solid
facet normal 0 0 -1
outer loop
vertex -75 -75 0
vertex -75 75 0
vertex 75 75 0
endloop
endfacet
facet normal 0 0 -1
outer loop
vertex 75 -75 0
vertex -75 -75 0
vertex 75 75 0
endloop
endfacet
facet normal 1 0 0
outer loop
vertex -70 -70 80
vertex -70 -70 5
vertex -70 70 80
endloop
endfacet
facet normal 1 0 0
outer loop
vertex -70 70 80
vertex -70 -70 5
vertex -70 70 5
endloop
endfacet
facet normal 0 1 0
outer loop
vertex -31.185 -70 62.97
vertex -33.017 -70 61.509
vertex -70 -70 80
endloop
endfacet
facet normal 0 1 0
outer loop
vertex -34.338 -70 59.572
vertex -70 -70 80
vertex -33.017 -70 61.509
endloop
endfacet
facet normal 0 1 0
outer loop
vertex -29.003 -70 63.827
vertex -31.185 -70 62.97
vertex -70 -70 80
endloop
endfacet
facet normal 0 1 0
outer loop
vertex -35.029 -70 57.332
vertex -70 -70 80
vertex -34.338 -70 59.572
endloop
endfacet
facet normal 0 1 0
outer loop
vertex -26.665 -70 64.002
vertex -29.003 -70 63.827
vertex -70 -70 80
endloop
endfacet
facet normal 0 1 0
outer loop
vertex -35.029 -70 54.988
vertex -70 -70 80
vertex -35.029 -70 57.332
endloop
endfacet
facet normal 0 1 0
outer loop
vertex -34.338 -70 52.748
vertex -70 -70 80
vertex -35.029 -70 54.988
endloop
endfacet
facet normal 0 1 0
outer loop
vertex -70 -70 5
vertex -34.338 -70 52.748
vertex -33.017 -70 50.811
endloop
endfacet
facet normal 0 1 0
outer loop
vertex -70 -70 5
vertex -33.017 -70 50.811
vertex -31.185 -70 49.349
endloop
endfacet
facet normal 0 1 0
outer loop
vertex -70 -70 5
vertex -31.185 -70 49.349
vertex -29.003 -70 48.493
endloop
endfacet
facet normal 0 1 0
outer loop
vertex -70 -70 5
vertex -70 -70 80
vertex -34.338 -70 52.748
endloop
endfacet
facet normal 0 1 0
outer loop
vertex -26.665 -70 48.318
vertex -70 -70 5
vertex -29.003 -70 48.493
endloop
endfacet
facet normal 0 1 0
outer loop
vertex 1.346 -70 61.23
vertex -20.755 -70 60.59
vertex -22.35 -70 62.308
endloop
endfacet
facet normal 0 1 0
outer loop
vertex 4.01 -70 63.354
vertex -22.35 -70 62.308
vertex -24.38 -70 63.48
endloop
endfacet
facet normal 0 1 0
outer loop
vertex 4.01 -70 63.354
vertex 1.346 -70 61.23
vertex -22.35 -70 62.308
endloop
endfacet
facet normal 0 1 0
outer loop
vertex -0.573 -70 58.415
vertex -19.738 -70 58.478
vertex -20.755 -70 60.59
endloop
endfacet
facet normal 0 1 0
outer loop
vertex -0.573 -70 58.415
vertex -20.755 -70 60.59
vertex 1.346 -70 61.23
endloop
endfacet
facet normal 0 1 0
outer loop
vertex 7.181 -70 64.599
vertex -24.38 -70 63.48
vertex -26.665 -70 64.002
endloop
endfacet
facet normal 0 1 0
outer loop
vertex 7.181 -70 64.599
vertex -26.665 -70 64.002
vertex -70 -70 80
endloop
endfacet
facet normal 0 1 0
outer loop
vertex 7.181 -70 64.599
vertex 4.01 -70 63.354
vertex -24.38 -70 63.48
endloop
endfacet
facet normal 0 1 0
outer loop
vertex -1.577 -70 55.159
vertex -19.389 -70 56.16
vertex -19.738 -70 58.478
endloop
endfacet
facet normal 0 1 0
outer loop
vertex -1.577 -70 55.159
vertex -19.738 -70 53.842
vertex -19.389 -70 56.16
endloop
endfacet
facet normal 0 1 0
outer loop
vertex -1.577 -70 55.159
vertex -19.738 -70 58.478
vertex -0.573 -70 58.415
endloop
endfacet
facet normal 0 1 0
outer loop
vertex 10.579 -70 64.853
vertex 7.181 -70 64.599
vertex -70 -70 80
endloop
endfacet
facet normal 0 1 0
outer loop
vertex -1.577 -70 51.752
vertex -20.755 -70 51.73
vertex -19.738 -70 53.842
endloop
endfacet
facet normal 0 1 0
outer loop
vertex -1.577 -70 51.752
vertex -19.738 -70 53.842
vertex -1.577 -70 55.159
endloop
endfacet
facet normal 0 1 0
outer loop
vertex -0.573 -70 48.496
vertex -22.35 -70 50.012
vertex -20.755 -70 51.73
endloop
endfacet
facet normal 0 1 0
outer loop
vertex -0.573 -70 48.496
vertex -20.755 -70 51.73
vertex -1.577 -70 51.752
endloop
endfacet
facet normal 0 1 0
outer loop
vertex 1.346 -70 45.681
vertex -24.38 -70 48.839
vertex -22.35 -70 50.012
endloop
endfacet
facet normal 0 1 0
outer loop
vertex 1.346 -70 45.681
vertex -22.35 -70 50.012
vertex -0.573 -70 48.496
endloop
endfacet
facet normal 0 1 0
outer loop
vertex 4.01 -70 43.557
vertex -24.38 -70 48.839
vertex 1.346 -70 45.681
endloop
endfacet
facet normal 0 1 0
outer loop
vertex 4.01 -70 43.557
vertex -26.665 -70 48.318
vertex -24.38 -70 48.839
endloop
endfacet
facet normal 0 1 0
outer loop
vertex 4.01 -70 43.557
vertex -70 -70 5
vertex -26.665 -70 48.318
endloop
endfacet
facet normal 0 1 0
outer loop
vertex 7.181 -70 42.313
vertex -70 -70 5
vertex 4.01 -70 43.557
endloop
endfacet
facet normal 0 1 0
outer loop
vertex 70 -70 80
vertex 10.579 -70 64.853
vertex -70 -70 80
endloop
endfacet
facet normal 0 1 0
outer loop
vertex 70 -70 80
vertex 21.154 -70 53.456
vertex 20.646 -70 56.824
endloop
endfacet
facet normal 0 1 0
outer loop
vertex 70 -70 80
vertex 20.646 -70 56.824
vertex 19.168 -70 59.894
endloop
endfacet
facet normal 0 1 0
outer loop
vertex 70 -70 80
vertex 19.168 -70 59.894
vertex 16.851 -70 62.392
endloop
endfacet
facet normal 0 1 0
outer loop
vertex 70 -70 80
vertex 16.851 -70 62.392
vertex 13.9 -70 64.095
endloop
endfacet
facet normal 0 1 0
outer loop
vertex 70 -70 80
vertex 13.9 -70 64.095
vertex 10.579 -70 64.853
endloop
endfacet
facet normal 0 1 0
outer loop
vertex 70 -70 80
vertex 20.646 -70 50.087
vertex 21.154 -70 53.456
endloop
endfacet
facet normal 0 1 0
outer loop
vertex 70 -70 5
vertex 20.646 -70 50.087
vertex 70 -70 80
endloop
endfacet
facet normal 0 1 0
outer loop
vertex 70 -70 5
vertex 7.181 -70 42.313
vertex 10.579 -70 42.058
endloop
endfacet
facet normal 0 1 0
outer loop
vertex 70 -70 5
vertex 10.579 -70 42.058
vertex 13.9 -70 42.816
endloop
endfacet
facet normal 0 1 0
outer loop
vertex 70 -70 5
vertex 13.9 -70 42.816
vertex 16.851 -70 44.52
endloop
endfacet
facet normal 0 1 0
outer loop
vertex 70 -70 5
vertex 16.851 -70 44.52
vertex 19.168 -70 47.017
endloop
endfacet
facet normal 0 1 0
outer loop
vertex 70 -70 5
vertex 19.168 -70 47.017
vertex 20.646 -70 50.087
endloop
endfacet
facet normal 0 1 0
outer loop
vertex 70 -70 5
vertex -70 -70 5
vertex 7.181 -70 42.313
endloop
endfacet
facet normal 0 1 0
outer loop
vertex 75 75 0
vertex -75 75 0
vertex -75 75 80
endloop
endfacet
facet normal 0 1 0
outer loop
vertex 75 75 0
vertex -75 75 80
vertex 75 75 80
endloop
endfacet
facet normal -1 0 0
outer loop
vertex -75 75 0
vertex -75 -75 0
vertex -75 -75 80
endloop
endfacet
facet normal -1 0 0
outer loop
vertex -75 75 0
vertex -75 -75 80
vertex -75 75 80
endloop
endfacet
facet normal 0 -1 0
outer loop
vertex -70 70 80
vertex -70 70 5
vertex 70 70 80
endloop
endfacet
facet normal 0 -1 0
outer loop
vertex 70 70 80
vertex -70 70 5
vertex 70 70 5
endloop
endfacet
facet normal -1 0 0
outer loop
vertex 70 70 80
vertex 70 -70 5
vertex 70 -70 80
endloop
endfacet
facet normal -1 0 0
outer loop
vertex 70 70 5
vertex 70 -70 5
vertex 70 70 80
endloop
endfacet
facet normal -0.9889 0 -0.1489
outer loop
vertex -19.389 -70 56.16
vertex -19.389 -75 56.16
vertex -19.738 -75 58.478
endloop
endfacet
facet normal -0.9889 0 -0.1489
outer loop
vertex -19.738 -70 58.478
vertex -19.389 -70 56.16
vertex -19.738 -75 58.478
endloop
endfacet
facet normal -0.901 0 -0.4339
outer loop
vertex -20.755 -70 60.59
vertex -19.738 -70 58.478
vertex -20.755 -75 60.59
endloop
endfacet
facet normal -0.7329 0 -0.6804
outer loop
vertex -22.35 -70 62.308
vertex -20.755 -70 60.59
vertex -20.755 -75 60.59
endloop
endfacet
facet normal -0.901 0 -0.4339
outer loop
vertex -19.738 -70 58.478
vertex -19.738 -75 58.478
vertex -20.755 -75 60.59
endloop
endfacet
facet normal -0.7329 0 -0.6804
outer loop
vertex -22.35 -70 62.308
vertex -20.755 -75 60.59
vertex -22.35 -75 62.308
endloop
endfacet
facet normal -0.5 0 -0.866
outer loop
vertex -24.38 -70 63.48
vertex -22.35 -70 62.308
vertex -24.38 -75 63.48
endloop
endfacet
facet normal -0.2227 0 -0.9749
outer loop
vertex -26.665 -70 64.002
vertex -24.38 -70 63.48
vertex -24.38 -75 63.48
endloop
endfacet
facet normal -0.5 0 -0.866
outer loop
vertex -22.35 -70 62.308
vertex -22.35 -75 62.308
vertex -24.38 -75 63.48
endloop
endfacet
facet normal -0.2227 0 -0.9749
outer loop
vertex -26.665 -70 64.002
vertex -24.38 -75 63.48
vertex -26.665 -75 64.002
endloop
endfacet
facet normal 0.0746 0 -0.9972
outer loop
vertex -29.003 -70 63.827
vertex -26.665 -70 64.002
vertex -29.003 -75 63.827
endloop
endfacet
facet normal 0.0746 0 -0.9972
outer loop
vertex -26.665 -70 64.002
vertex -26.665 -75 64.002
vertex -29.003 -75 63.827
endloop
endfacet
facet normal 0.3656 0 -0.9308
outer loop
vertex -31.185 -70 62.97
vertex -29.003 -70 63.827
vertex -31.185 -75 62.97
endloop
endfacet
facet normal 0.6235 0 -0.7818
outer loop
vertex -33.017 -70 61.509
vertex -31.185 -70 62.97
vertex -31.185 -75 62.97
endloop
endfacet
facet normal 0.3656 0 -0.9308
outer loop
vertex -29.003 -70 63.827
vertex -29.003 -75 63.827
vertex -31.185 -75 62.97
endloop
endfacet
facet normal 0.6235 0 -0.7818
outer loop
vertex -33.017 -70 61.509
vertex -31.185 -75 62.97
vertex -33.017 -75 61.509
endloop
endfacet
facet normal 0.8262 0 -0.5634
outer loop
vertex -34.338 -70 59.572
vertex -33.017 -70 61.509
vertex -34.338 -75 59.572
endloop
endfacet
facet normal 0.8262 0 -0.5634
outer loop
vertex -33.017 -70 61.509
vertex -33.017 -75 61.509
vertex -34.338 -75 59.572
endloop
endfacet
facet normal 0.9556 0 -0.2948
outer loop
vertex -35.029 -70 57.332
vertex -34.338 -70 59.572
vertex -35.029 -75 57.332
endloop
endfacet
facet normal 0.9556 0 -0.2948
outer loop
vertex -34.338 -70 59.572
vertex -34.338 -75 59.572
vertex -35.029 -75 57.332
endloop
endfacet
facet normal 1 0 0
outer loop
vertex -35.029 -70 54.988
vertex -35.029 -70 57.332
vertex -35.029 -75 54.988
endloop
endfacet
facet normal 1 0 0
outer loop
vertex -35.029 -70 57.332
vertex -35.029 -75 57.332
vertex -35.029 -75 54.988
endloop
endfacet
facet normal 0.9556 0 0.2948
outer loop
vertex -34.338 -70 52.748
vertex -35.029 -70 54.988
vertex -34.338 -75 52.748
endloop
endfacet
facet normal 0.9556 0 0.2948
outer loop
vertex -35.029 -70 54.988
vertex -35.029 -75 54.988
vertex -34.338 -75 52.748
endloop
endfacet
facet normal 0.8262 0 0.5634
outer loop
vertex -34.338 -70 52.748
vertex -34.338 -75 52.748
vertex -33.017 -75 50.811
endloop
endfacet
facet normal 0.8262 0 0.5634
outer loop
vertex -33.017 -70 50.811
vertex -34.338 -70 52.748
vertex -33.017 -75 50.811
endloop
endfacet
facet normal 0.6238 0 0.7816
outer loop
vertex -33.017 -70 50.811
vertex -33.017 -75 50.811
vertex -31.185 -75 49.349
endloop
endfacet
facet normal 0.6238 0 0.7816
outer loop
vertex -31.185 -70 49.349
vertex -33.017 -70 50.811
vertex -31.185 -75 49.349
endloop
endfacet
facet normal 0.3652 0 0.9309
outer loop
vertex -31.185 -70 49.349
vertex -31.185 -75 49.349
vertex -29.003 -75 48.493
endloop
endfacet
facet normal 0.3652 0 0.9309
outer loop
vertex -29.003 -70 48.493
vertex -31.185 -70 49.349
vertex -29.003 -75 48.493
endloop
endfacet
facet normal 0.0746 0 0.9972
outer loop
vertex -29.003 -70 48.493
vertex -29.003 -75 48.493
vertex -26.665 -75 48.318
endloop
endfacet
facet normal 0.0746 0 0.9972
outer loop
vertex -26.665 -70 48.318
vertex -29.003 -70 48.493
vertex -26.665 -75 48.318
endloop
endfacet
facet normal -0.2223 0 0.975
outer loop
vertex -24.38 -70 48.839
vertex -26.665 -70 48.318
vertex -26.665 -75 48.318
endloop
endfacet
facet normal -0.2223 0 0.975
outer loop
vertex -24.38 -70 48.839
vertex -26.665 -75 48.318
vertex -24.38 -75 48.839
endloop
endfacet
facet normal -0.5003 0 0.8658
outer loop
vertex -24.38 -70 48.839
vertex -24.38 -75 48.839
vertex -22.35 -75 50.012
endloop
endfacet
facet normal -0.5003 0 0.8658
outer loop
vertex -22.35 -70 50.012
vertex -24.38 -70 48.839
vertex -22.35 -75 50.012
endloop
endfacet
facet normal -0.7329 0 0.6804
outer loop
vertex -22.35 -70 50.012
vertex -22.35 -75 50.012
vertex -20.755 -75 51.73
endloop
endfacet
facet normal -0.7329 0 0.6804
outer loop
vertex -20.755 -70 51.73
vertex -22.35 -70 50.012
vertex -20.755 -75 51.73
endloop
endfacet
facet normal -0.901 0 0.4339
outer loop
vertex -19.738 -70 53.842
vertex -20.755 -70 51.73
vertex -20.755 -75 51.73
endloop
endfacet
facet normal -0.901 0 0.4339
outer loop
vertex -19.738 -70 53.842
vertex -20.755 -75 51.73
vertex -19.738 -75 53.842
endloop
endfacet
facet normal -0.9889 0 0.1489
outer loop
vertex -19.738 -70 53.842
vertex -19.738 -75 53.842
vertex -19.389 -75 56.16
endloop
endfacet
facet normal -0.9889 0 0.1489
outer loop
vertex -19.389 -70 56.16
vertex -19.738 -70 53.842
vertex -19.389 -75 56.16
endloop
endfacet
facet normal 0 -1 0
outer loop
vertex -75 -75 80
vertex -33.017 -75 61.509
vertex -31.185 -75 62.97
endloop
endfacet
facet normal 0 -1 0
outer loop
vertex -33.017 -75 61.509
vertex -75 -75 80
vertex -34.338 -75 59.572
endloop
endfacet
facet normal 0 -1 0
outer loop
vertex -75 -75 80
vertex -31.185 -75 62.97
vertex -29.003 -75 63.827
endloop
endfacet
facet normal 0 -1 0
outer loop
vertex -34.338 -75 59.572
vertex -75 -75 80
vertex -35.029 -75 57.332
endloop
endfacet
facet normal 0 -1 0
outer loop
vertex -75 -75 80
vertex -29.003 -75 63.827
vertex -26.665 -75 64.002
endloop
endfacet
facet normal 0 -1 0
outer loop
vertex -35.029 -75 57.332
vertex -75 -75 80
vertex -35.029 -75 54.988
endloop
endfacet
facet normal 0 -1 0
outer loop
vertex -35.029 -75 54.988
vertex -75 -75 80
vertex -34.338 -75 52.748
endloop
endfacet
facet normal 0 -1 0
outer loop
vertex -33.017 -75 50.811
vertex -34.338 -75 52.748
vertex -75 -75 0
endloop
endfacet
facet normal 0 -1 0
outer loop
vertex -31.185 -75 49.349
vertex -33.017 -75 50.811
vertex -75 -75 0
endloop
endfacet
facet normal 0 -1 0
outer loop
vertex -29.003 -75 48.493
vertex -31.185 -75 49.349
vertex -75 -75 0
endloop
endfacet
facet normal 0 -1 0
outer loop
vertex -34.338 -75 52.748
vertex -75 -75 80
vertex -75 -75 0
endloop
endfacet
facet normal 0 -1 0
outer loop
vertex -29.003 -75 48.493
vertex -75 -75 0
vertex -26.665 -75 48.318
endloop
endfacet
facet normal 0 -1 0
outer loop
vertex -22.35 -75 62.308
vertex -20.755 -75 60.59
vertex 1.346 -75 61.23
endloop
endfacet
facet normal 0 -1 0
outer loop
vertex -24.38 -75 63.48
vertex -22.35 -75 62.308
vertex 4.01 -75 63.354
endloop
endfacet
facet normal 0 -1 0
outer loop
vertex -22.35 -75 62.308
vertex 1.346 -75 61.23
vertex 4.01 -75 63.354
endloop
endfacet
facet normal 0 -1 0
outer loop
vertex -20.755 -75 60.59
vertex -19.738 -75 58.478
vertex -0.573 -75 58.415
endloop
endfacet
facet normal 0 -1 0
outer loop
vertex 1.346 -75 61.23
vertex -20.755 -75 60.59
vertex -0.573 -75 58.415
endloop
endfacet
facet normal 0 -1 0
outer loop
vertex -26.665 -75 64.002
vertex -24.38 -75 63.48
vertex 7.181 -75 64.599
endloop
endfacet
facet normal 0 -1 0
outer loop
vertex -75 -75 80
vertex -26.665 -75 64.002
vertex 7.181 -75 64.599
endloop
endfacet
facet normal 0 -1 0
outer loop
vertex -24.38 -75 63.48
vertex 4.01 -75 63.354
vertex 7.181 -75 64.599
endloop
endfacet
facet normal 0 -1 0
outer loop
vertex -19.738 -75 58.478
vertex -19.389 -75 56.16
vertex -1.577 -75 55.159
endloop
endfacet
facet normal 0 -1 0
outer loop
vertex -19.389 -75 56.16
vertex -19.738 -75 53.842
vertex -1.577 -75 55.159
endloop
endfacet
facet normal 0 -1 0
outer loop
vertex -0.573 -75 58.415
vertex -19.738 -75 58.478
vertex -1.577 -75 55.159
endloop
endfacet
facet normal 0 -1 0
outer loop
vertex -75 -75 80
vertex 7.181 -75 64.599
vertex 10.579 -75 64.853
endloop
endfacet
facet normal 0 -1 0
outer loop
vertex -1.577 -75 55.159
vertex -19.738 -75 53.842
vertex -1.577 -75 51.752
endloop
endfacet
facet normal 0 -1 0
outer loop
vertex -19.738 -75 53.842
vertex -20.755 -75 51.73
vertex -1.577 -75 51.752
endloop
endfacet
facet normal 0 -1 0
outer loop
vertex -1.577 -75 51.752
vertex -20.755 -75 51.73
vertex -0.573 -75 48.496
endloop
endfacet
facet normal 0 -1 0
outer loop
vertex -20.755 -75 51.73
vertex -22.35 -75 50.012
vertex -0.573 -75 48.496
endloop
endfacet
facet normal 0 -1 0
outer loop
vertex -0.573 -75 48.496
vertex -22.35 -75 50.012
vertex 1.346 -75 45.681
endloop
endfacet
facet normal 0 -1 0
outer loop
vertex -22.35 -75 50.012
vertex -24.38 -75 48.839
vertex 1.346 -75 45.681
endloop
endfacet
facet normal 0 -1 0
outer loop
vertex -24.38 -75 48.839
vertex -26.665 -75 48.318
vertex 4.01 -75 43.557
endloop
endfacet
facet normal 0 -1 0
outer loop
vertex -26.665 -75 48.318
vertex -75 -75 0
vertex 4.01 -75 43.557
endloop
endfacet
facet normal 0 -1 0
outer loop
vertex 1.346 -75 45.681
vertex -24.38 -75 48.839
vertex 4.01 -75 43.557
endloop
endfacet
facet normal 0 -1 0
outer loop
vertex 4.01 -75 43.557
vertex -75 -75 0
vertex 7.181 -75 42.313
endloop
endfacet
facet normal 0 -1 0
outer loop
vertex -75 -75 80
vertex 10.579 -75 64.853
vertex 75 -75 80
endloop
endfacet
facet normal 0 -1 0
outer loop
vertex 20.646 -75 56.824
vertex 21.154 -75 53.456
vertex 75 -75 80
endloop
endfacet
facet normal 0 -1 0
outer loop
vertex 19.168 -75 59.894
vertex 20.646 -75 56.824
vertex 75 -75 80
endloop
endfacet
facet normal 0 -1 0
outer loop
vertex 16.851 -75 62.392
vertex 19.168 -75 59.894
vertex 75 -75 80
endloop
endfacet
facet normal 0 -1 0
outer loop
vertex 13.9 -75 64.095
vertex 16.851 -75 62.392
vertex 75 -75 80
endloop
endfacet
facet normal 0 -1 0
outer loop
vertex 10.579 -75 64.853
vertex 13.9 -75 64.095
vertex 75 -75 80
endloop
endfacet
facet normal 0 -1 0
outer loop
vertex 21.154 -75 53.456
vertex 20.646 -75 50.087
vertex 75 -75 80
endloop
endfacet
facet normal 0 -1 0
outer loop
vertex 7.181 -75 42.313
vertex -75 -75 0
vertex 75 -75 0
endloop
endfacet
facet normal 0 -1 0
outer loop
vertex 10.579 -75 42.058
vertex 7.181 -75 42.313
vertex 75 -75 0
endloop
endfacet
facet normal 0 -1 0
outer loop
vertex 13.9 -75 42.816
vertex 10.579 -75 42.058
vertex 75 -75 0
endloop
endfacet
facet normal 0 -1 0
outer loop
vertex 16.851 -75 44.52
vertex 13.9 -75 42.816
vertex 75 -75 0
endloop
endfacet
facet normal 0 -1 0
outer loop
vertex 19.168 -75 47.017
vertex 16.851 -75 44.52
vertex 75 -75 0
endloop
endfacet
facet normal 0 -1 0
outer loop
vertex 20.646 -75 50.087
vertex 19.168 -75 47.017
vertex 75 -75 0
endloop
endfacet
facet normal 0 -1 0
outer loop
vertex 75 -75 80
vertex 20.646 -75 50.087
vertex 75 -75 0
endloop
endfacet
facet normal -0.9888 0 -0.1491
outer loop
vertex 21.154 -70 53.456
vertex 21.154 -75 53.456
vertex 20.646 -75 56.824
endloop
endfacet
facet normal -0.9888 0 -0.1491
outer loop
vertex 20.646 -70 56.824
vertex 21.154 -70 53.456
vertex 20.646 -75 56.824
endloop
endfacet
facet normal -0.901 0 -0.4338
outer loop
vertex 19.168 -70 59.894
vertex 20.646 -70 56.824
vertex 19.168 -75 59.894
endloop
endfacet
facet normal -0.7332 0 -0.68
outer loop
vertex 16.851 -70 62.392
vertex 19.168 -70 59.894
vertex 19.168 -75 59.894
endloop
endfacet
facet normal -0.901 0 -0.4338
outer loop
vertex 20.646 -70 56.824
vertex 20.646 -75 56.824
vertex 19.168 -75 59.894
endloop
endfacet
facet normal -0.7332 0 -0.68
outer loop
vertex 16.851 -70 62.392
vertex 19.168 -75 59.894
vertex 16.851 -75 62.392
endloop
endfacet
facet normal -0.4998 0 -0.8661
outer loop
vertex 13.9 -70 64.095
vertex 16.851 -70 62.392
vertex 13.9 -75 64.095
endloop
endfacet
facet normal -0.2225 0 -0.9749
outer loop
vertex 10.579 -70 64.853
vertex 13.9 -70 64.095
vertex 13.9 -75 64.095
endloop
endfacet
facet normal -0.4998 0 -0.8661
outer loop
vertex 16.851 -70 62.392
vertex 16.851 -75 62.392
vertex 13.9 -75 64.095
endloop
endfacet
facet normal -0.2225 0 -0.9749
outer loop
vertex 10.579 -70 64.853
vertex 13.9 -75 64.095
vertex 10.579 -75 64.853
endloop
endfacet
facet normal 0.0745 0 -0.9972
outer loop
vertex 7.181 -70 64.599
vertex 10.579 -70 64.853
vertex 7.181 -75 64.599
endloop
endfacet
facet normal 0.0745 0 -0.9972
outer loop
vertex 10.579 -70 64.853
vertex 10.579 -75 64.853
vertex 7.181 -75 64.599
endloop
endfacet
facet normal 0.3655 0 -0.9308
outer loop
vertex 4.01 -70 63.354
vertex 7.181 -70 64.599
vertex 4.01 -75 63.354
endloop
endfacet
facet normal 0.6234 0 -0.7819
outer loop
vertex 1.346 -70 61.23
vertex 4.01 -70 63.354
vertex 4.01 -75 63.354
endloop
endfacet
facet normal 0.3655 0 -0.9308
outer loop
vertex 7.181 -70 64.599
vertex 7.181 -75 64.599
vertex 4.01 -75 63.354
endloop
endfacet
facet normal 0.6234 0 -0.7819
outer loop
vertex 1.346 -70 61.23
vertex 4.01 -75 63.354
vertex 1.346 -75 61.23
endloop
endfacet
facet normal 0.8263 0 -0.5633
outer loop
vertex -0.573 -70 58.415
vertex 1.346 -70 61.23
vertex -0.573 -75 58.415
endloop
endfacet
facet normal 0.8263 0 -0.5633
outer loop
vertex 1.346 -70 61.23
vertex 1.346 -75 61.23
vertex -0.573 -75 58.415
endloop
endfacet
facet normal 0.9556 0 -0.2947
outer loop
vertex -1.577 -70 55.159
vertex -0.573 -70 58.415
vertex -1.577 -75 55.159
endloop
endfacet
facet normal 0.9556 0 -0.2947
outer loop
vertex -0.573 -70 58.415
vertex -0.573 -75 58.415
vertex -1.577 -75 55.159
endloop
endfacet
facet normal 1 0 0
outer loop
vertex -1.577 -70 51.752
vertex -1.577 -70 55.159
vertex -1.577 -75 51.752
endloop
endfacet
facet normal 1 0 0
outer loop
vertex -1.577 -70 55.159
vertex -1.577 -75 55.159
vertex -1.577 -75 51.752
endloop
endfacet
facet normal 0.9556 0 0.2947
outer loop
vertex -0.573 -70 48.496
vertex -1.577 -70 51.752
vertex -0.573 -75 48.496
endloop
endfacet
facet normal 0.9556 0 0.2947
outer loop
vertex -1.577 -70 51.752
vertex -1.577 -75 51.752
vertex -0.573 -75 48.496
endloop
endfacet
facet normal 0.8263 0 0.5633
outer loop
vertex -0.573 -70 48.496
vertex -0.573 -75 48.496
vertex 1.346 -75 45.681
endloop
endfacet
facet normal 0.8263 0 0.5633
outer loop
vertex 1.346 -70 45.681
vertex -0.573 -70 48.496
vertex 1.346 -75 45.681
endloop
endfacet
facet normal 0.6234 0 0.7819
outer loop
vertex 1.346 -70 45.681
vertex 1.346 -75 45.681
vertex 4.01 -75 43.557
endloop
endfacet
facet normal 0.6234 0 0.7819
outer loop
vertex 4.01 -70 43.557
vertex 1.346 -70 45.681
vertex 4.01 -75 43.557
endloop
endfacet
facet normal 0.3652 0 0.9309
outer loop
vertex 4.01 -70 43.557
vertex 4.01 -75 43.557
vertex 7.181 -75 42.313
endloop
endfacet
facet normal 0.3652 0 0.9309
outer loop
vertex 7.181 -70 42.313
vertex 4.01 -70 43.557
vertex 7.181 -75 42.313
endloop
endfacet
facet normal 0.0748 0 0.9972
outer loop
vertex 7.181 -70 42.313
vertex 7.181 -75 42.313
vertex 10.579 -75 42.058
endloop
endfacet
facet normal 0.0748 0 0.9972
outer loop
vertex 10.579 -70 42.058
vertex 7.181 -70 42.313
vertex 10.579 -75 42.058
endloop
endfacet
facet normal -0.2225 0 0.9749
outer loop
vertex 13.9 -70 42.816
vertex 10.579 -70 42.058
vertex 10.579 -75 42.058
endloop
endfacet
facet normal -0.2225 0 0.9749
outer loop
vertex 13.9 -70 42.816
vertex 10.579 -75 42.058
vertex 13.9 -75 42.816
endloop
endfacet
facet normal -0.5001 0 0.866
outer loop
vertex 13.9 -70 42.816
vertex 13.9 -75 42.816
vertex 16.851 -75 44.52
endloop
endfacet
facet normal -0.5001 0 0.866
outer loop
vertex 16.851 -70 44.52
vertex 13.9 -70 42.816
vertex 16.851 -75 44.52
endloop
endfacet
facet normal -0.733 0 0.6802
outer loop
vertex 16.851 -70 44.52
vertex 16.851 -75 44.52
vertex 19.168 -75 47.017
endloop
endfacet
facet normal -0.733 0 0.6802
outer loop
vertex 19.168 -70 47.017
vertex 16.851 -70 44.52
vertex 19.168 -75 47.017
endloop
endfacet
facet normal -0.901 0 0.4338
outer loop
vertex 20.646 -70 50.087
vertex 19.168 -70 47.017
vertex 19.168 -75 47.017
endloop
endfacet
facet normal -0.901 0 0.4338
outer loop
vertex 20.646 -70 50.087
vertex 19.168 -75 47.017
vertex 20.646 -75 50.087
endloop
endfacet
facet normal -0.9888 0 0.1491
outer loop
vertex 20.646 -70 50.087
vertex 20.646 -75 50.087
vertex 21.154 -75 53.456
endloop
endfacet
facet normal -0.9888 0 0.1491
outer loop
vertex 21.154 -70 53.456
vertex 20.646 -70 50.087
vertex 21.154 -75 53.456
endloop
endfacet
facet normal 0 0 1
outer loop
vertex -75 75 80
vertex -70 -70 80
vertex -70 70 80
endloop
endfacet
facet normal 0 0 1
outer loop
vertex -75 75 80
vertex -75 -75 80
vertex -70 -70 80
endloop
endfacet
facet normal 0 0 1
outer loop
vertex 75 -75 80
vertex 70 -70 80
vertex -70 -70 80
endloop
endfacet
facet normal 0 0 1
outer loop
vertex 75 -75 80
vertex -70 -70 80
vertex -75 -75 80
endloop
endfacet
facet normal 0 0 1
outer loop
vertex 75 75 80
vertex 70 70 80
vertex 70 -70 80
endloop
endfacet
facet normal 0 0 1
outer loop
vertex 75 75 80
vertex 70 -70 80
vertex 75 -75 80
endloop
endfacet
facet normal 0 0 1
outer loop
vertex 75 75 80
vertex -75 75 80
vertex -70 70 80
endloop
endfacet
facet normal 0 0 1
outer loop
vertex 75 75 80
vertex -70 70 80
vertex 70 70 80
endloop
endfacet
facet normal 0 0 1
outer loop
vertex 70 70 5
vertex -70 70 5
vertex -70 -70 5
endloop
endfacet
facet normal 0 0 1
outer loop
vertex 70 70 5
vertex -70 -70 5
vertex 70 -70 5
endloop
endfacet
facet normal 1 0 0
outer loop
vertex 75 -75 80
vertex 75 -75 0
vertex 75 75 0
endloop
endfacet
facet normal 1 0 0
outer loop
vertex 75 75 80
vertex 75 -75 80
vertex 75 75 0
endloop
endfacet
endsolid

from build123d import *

# Parameters (mm, degrees)
F0_W     = 150
F0_H     = 150
F1_DEPTH = 80
F2_T     = -5
F3_R     = 7.863992
F3_R_2   = 11.429543
F4_DEPTH = 25


with BuildPart() as f1:
    # F0 (on Top) → F1 (new body)
    with BuildSketch(Plane.XY):
        Rectangle(F0_W, F0_H)
    extrude(amount=F1_DEPTH)

    # F2
    f2_openings = [f1.faces().sort_by_distance(p)[0] for p in [
        (0, 0, 80),
    ]]
    offset(amount=F2_T, openings=f2_openings)

    # F3 (on face) → F4 (cut)
    with BuildSketch(Plane.XZ.offset(75)):
        with Locations((-27.252719, 56.159835)):
            Circle(F3_R)
        with Locations((9.724549, 53.455554)):
            Circle(F3_R_2)
    extrude(amount=-F4_DEPTH, mode=Mode.SUBTRACT)


solid = f1.part
